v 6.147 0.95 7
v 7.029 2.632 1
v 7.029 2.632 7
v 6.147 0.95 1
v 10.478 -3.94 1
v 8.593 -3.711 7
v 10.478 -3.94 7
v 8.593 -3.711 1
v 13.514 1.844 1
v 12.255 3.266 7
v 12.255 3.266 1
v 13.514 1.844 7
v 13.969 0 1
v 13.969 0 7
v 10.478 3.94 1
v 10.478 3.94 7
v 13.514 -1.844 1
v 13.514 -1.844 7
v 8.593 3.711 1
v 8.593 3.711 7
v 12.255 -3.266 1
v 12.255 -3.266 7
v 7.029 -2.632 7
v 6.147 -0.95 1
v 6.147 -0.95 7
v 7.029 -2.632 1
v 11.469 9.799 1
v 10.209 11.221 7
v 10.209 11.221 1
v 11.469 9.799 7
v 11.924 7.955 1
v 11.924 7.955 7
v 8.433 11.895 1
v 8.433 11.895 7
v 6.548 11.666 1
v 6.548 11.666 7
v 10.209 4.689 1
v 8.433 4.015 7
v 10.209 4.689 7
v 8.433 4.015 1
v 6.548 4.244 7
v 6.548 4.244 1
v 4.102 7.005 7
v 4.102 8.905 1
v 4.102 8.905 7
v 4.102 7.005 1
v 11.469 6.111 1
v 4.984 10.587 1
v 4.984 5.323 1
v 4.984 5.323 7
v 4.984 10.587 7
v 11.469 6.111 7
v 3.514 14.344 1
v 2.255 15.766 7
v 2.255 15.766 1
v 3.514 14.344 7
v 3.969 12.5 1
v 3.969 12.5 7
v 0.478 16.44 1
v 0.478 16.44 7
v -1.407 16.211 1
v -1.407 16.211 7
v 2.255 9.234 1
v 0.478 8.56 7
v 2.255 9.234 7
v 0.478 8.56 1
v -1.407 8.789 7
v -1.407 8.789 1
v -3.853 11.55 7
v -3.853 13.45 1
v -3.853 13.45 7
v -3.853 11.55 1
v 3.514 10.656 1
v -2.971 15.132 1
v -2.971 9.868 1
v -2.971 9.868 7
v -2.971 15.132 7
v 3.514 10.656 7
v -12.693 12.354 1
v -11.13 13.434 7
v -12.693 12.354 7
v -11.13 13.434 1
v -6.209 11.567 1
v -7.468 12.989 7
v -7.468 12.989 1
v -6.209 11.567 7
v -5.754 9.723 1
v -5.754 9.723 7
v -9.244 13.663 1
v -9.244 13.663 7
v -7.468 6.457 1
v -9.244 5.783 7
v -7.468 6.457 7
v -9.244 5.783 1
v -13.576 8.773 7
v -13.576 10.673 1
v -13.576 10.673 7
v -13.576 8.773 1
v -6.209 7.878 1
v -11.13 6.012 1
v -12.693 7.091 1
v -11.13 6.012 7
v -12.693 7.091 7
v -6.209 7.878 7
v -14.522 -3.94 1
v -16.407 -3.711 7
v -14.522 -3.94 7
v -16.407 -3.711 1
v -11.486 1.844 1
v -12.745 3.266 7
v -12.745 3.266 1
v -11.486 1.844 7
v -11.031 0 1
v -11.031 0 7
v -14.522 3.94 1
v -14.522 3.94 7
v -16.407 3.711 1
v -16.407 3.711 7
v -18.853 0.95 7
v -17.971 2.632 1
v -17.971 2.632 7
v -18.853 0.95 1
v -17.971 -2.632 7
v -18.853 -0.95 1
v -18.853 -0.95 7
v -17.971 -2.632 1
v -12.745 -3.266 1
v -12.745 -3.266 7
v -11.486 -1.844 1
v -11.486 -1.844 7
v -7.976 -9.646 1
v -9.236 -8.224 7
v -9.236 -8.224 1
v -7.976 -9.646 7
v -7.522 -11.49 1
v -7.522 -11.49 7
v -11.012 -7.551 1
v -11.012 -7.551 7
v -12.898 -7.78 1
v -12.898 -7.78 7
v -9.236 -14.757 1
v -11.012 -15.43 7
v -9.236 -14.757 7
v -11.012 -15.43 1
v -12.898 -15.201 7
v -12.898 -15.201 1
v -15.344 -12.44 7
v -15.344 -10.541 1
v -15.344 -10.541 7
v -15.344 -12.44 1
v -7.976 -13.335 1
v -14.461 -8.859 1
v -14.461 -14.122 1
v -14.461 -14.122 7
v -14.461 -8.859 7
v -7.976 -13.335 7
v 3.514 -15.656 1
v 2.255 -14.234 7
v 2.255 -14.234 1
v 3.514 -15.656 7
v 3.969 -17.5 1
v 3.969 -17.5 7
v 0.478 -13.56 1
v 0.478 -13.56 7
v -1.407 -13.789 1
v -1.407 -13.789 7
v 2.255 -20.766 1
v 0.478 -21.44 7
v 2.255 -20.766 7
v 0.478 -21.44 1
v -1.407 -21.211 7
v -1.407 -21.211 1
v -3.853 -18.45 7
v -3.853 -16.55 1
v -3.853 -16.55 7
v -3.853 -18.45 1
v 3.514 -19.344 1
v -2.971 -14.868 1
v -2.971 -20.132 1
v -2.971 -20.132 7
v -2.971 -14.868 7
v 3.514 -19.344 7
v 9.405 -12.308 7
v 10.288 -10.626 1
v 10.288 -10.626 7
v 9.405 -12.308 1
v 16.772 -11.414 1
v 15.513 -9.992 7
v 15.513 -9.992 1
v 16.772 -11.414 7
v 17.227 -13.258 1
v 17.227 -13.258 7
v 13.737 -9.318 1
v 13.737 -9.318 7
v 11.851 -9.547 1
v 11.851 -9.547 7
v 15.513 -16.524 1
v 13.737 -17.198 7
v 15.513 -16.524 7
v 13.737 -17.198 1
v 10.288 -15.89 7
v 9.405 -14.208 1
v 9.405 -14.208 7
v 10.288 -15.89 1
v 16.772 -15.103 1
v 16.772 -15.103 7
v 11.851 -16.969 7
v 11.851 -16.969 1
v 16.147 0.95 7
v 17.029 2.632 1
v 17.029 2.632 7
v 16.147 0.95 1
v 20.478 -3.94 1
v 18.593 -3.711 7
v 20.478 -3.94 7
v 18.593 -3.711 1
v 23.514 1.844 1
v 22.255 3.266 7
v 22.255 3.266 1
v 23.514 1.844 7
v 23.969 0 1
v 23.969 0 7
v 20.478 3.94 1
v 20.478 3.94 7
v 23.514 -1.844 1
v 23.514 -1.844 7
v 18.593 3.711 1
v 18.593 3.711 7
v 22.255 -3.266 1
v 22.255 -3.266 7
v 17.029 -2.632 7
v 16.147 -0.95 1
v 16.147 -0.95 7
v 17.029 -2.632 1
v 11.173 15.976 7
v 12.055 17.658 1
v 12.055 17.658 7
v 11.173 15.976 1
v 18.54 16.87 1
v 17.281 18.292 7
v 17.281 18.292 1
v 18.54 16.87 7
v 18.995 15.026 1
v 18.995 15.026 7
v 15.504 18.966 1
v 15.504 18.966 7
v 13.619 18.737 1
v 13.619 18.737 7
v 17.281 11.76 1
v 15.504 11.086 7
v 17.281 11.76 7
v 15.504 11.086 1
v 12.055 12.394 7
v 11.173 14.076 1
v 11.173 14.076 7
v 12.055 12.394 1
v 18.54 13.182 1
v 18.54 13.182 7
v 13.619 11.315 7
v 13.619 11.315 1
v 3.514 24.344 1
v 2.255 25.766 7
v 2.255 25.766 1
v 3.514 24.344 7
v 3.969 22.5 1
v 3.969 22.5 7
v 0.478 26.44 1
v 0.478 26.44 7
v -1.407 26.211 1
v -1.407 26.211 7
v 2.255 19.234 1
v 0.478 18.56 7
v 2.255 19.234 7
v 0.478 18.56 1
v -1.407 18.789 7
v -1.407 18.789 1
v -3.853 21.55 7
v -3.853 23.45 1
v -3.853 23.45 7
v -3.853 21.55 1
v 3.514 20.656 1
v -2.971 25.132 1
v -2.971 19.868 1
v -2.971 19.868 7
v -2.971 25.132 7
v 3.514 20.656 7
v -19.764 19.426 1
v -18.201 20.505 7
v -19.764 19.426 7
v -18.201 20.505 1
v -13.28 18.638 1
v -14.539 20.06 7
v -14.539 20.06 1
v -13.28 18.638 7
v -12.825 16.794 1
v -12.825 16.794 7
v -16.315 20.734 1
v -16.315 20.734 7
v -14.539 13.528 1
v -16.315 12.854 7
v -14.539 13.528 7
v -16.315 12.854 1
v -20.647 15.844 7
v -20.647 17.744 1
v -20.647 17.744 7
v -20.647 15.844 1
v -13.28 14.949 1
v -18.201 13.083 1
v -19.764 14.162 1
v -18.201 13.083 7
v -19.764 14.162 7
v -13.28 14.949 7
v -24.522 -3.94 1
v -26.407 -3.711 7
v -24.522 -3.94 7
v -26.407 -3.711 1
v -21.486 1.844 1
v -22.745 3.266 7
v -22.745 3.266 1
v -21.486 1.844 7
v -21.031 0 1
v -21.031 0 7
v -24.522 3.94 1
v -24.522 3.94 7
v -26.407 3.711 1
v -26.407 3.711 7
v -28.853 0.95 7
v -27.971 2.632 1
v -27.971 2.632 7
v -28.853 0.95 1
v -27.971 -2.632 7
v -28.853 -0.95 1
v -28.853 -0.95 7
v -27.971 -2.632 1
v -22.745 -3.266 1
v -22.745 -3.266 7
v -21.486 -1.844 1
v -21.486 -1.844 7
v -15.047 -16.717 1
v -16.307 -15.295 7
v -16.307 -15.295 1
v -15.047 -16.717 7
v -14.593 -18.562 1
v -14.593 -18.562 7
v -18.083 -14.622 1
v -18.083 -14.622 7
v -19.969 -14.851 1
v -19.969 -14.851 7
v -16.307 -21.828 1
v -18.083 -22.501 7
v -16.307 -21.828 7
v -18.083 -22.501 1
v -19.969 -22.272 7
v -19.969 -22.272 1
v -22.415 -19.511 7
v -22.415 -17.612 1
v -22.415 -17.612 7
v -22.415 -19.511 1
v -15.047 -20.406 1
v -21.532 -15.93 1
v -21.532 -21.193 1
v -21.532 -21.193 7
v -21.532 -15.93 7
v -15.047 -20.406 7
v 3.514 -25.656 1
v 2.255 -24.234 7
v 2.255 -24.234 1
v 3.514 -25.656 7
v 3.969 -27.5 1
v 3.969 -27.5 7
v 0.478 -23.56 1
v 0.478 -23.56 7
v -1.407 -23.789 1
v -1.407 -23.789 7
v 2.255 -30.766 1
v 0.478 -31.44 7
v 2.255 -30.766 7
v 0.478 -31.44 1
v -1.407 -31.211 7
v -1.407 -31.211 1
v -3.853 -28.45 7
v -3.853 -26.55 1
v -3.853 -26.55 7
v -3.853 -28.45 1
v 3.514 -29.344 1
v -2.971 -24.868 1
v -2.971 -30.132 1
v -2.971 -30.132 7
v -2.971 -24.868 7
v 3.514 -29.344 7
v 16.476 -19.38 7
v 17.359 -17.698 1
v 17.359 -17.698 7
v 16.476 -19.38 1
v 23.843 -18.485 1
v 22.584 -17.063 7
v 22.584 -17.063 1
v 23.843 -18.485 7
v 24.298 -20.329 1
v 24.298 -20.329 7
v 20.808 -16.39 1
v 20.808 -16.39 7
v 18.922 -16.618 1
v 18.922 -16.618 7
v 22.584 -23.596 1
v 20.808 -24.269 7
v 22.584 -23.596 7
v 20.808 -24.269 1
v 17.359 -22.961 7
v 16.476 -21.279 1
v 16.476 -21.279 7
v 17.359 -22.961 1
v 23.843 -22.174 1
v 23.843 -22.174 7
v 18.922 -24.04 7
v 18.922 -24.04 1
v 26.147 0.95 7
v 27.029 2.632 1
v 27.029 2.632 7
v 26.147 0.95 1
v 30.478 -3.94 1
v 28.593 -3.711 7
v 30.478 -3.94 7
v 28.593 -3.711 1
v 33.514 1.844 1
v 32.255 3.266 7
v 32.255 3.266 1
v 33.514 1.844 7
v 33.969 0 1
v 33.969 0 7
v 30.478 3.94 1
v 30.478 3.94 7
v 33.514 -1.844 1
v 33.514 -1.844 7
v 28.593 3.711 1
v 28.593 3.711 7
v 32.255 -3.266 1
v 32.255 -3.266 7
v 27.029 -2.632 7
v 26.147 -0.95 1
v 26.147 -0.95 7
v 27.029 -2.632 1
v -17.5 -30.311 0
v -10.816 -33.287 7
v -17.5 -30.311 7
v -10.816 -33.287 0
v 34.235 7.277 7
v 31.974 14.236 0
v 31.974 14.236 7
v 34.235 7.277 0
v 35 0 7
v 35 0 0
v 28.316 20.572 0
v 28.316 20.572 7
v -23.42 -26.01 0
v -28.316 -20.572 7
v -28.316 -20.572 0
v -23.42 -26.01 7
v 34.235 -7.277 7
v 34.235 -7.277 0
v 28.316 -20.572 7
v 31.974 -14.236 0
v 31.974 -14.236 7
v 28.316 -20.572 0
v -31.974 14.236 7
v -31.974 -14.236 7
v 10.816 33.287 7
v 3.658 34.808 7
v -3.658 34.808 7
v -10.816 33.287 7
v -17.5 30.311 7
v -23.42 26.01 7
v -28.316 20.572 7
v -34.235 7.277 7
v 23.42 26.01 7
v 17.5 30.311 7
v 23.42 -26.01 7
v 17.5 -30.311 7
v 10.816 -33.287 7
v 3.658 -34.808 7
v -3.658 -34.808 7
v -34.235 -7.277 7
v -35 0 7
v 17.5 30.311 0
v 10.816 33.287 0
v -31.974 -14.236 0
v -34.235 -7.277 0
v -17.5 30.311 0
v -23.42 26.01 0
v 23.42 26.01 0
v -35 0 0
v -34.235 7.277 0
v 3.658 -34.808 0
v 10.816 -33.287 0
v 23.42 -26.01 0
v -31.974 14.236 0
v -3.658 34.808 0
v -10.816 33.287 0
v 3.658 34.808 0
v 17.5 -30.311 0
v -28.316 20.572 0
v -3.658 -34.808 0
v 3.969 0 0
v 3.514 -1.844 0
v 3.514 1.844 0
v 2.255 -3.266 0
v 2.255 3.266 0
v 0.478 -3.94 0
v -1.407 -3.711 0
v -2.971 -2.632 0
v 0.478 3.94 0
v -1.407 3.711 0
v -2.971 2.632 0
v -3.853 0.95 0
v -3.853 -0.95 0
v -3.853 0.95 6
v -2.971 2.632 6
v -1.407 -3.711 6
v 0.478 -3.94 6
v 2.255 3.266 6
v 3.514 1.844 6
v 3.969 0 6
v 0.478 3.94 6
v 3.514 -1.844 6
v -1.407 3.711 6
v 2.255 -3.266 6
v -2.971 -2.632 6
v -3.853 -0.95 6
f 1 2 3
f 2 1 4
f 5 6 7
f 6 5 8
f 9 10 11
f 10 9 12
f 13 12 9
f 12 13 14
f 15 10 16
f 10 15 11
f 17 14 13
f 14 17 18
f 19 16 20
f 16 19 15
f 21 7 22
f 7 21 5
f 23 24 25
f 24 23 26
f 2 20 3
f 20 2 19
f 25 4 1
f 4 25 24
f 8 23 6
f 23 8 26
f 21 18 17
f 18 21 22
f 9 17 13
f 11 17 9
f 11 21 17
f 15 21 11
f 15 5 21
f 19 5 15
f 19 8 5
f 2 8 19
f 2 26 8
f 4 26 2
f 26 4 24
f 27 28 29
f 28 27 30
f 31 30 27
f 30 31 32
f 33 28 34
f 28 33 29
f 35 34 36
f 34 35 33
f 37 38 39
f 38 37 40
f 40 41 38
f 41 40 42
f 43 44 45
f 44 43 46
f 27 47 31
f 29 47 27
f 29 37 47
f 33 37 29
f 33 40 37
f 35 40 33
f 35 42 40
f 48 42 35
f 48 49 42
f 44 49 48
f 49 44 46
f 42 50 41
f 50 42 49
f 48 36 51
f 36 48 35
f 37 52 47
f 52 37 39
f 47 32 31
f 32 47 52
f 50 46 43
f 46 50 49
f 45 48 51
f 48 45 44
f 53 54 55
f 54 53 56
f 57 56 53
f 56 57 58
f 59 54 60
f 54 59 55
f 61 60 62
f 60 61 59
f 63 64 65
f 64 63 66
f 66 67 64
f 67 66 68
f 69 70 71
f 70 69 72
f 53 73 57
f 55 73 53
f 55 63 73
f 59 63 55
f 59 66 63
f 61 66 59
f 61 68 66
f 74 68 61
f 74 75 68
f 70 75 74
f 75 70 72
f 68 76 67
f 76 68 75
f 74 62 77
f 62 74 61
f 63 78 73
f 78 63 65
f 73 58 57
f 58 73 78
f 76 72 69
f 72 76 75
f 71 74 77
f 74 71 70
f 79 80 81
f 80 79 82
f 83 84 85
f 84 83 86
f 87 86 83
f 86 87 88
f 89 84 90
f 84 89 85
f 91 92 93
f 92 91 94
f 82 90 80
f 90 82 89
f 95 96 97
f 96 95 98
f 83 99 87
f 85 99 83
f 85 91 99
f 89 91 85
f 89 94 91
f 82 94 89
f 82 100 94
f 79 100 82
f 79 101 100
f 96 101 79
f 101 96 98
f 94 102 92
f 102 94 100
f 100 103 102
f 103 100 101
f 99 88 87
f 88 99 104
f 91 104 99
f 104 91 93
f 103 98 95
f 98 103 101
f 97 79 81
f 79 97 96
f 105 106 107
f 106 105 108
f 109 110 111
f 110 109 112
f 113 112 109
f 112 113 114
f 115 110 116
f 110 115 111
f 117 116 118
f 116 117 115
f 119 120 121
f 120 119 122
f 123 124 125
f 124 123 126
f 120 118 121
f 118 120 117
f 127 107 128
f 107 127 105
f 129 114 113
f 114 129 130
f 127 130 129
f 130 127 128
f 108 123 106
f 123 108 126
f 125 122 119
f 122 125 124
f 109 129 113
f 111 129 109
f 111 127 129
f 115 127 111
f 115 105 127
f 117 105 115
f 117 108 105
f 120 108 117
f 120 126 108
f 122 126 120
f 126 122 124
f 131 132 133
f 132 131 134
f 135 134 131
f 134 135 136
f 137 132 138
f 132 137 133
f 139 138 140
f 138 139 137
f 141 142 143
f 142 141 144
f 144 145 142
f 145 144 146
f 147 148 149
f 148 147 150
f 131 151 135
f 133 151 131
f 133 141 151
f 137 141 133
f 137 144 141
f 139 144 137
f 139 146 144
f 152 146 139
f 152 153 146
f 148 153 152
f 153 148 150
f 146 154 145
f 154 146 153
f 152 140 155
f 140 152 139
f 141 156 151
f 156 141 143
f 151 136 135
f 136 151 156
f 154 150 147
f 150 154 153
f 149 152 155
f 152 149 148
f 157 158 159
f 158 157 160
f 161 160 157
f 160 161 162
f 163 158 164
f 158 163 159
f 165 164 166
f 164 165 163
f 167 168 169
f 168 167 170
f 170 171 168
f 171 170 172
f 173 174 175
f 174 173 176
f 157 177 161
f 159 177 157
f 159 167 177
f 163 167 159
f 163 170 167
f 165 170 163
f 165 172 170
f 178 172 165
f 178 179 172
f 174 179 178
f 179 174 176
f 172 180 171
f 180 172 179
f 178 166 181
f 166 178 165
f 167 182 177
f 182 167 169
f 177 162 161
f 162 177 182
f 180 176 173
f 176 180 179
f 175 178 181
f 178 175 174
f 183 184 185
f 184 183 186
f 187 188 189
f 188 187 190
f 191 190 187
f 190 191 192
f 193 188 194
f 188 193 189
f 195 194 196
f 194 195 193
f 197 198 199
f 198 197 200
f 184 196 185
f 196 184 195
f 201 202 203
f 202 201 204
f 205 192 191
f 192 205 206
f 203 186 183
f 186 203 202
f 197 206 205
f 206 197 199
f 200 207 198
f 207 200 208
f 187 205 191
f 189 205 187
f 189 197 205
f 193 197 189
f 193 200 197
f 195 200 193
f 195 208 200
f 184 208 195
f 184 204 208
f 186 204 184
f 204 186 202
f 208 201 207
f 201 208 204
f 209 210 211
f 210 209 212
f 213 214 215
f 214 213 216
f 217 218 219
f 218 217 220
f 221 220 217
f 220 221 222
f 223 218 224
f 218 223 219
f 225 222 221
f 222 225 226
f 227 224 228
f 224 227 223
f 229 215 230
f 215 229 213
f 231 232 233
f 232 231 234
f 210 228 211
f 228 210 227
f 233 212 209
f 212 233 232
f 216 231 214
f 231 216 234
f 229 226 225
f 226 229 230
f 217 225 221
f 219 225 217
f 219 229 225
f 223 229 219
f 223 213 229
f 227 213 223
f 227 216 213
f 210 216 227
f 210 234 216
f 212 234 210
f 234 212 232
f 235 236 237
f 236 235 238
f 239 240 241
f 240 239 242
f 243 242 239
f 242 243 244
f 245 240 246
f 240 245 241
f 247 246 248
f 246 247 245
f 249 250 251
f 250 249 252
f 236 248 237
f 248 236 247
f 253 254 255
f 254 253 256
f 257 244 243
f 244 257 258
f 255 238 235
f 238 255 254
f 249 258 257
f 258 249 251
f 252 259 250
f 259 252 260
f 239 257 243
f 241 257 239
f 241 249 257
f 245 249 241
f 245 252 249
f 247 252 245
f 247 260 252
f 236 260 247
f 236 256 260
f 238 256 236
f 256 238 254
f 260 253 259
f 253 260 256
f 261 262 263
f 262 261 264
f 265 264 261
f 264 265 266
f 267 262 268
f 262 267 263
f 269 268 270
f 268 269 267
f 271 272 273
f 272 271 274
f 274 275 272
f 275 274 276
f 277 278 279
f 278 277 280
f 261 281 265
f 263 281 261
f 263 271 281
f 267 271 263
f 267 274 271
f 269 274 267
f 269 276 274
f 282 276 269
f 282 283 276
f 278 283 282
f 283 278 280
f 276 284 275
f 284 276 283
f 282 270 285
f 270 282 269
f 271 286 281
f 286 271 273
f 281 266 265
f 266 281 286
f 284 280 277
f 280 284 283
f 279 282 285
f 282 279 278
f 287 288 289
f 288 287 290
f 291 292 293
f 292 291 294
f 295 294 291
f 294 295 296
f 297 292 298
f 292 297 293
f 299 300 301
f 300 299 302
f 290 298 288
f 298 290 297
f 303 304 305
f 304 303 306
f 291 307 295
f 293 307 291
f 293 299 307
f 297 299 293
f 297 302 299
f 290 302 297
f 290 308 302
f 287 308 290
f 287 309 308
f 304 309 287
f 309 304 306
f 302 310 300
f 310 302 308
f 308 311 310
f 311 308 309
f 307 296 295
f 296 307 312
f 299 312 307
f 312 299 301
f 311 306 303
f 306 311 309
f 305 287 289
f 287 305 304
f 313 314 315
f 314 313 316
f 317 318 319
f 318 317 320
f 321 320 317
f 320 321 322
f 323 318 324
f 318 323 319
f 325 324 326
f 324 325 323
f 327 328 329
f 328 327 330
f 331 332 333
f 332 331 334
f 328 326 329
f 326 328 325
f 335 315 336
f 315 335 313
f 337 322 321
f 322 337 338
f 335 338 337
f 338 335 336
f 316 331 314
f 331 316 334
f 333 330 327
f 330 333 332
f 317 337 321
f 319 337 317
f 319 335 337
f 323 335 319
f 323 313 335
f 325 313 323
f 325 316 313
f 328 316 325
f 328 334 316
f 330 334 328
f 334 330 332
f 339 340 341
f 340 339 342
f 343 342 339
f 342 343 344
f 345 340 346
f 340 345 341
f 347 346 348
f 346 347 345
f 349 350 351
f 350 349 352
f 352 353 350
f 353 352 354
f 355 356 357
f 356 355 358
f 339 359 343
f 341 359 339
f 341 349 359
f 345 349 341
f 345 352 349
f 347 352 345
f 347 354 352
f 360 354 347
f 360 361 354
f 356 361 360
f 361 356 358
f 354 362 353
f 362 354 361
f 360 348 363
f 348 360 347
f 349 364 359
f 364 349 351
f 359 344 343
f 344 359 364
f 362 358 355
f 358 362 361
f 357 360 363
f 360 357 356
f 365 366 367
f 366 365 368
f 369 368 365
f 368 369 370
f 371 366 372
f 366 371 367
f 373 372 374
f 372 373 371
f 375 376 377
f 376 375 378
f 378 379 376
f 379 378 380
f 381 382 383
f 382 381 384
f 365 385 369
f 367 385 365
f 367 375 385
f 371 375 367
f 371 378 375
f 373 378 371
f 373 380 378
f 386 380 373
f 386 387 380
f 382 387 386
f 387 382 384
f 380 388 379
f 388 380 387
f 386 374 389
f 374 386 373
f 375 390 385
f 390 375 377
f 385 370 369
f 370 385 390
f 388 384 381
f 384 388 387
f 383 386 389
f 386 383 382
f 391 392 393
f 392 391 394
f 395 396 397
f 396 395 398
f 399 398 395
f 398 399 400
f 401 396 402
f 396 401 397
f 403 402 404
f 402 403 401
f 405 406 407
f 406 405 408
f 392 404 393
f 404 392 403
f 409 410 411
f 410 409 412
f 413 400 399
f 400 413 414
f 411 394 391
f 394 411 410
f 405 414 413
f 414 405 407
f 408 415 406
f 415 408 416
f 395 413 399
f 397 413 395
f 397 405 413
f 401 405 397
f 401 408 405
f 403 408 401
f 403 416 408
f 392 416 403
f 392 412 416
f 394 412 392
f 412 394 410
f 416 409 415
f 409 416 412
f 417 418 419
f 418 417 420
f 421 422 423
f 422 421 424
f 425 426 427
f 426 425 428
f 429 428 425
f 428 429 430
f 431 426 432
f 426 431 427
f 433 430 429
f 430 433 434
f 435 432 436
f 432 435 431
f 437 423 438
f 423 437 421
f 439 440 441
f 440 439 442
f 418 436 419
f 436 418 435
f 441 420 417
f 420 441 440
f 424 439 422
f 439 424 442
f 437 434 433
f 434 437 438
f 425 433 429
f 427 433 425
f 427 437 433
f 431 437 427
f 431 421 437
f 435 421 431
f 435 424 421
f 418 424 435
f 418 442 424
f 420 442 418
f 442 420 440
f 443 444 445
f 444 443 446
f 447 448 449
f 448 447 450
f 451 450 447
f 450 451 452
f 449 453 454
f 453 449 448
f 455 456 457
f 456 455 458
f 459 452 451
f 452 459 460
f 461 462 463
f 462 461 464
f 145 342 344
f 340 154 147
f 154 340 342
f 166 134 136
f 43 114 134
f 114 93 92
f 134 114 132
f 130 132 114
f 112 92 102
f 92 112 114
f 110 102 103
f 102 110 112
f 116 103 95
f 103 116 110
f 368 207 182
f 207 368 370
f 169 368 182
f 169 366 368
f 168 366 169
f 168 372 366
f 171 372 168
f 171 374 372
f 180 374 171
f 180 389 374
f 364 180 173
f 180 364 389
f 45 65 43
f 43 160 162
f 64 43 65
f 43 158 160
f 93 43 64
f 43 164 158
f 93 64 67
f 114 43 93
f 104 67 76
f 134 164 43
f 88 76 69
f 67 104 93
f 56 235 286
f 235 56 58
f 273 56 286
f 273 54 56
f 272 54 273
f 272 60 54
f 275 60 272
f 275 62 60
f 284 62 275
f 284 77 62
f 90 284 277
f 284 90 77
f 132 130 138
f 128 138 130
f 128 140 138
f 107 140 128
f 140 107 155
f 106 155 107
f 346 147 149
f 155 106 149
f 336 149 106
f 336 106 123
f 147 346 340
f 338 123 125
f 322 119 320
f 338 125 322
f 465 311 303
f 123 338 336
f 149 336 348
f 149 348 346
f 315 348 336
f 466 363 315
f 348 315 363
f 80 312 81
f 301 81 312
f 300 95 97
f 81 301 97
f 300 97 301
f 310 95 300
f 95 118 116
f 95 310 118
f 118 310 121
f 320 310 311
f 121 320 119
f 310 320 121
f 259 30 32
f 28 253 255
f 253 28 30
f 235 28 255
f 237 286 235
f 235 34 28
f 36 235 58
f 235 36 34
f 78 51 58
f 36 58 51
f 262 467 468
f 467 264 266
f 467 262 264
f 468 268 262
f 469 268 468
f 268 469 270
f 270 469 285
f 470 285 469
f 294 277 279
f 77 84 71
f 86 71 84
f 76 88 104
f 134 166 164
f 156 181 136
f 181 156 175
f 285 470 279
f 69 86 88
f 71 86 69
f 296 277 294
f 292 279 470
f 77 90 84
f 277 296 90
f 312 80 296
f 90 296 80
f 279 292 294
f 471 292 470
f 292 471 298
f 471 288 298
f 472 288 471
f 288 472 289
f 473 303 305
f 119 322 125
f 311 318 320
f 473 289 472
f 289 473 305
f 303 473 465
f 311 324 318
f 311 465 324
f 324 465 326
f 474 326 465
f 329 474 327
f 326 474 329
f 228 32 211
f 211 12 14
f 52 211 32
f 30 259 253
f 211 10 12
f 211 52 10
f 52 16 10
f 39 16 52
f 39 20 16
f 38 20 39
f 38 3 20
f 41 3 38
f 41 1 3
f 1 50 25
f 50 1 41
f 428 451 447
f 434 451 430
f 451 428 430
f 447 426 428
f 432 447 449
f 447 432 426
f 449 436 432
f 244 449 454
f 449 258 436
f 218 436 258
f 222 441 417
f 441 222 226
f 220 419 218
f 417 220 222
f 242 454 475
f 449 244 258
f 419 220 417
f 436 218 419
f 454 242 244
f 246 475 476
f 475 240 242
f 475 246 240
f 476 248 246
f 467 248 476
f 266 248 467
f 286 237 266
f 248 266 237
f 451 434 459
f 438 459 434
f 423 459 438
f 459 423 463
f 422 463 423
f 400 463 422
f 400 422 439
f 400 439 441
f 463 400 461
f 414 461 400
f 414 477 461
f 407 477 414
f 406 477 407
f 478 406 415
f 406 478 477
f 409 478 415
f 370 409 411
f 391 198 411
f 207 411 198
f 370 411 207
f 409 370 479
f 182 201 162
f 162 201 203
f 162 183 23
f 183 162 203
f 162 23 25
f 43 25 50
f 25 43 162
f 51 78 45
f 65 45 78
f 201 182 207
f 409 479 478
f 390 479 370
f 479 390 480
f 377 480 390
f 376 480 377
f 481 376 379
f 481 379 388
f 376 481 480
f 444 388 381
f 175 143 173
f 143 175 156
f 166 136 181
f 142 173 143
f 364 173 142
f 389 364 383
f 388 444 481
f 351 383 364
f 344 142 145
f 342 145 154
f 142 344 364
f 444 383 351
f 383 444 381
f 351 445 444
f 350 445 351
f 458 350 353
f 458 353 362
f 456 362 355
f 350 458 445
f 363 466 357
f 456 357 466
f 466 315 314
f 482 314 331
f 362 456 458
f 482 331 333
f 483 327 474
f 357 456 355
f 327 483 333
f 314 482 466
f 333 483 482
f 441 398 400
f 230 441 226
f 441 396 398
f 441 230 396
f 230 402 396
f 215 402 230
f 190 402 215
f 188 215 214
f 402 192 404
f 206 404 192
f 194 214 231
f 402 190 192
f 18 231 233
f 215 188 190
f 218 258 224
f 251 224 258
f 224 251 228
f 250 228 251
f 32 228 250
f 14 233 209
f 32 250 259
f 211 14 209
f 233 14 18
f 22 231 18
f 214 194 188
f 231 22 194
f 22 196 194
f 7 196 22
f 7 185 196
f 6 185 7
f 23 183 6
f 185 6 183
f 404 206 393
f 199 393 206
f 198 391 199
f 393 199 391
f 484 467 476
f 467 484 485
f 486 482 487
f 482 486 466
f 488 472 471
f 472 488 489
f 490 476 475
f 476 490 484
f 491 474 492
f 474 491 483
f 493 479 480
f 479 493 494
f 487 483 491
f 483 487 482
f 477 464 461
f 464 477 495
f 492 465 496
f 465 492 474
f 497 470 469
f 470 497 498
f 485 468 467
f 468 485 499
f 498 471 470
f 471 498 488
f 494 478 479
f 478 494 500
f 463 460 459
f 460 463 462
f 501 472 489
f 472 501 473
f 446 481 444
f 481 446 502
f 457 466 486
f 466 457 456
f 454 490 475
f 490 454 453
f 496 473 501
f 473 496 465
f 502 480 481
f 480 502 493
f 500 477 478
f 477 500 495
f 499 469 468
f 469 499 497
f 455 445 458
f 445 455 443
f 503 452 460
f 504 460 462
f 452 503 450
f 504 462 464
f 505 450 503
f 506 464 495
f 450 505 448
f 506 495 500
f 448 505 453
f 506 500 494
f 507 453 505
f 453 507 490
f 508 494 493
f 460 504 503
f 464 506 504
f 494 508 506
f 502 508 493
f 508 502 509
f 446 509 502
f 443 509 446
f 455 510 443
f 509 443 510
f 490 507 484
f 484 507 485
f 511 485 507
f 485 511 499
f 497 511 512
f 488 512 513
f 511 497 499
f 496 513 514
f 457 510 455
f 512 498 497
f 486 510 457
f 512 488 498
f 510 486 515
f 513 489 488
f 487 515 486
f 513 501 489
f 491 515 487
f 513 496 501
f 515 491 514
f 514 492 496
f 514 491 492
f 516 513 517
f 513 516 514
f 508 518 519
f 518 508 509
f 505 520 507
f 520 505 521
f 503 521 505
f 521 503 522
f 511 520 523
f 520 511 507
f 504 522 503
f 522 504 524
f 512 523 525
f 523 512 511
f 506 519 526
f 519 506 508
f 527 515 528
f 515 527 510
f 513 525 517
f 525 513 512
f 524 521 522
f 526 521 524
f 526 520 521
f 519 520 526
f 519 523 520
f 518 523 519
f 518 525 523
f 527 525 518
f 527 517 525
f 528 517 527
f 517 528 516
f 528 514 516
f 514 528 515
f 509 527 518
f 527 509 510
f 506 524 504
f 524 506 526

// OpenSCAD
// file: constants.scad
/* sinusoid-plotter: A parametric sinusoid plotter made with OpenSCAD.
 * Copyright (C) 2013  Clayton G. Hobbs
 * 
 * This program is free software: you can redistribute it and/or modify
 * it under the terms of the GNU General Public License as published by
 * the Free Software Foundation, either version 3 of the License, or
 * (at your option) any later version.
 * 
 * This program is distributed in the hope that it will be useful,
 * but WITHOUT ANY WARRANTY; without even the implied warranty of
 * MERCHANTABILITY or FITNESS FOR A PARTICULAR PURPOSE.  See the
 * GNU General Public License for more details.
 * 
 * You should have received a copy of the GNU General Public License
 * along with this program.  If not, see <http://www.gnu.org/licenses/>.
 */

pi = 3.1415926535897932384626433832795;
// main file
/* sinusoid-plotter: A parametric sinusoid plotter made with OpenSCAD.
 * Copyright (C) 2013  Clayton G. Hobbs
 * 
 * This program is free software: you can redistribute it and/or modify
 * it under the terms of the GNU General Public License as published by
 * the Free Software Foundation, either version 3 of the License, or
 * (at your option) any later version.
 * 
 * This program is distributed in the hope that it will be useful,
 * but WITHOUT ANY WARRANTY; without even the implied warranty of
 * MERCHANTABILITY or FITNESS FOR A PARTICULAR PURPOSE.  See the
 * GNU General Public License for more details.
 * 
 * You should have received a copy of the GNU General Public License
 * along with this program.  If not, see <http://www.gnu.org/licenses/>.
 */

include <constants.scad>;

module top_disk(radius, height, axle_radius, axle_depth, holes, hole_distances,
                hole_radius, hole_circles)
{
	hole_lkp = [[0, hole_distances[0]], [holes-1, hole_distances[1]]];
	hole_angle = 360*hole_circles/(holes - 1);
	difference() {
		union() {
			cylinder(r = radius, h = height);
		}

		translate([0, 0, -1])
		cylinder(r = axle_radius, h = axle_depth + 2);

		for (x = [0:holes - 1]) {
			translate([lookup(x, hole_lkp)*cos(hole_angle*x),
                       lookup(x, hole_lkp)*sin(hole_angle*x), 1])
			cylinder(r = axle_radius, h = height);
		}
	}
}

top_disk(radius = 35, height = 7, axle_radius = 3.96875, axle_depth = 5,
         holes = 17, hole_distances = [10, 30], hole_radius = 3.96875,
         hole_circles = 2);
